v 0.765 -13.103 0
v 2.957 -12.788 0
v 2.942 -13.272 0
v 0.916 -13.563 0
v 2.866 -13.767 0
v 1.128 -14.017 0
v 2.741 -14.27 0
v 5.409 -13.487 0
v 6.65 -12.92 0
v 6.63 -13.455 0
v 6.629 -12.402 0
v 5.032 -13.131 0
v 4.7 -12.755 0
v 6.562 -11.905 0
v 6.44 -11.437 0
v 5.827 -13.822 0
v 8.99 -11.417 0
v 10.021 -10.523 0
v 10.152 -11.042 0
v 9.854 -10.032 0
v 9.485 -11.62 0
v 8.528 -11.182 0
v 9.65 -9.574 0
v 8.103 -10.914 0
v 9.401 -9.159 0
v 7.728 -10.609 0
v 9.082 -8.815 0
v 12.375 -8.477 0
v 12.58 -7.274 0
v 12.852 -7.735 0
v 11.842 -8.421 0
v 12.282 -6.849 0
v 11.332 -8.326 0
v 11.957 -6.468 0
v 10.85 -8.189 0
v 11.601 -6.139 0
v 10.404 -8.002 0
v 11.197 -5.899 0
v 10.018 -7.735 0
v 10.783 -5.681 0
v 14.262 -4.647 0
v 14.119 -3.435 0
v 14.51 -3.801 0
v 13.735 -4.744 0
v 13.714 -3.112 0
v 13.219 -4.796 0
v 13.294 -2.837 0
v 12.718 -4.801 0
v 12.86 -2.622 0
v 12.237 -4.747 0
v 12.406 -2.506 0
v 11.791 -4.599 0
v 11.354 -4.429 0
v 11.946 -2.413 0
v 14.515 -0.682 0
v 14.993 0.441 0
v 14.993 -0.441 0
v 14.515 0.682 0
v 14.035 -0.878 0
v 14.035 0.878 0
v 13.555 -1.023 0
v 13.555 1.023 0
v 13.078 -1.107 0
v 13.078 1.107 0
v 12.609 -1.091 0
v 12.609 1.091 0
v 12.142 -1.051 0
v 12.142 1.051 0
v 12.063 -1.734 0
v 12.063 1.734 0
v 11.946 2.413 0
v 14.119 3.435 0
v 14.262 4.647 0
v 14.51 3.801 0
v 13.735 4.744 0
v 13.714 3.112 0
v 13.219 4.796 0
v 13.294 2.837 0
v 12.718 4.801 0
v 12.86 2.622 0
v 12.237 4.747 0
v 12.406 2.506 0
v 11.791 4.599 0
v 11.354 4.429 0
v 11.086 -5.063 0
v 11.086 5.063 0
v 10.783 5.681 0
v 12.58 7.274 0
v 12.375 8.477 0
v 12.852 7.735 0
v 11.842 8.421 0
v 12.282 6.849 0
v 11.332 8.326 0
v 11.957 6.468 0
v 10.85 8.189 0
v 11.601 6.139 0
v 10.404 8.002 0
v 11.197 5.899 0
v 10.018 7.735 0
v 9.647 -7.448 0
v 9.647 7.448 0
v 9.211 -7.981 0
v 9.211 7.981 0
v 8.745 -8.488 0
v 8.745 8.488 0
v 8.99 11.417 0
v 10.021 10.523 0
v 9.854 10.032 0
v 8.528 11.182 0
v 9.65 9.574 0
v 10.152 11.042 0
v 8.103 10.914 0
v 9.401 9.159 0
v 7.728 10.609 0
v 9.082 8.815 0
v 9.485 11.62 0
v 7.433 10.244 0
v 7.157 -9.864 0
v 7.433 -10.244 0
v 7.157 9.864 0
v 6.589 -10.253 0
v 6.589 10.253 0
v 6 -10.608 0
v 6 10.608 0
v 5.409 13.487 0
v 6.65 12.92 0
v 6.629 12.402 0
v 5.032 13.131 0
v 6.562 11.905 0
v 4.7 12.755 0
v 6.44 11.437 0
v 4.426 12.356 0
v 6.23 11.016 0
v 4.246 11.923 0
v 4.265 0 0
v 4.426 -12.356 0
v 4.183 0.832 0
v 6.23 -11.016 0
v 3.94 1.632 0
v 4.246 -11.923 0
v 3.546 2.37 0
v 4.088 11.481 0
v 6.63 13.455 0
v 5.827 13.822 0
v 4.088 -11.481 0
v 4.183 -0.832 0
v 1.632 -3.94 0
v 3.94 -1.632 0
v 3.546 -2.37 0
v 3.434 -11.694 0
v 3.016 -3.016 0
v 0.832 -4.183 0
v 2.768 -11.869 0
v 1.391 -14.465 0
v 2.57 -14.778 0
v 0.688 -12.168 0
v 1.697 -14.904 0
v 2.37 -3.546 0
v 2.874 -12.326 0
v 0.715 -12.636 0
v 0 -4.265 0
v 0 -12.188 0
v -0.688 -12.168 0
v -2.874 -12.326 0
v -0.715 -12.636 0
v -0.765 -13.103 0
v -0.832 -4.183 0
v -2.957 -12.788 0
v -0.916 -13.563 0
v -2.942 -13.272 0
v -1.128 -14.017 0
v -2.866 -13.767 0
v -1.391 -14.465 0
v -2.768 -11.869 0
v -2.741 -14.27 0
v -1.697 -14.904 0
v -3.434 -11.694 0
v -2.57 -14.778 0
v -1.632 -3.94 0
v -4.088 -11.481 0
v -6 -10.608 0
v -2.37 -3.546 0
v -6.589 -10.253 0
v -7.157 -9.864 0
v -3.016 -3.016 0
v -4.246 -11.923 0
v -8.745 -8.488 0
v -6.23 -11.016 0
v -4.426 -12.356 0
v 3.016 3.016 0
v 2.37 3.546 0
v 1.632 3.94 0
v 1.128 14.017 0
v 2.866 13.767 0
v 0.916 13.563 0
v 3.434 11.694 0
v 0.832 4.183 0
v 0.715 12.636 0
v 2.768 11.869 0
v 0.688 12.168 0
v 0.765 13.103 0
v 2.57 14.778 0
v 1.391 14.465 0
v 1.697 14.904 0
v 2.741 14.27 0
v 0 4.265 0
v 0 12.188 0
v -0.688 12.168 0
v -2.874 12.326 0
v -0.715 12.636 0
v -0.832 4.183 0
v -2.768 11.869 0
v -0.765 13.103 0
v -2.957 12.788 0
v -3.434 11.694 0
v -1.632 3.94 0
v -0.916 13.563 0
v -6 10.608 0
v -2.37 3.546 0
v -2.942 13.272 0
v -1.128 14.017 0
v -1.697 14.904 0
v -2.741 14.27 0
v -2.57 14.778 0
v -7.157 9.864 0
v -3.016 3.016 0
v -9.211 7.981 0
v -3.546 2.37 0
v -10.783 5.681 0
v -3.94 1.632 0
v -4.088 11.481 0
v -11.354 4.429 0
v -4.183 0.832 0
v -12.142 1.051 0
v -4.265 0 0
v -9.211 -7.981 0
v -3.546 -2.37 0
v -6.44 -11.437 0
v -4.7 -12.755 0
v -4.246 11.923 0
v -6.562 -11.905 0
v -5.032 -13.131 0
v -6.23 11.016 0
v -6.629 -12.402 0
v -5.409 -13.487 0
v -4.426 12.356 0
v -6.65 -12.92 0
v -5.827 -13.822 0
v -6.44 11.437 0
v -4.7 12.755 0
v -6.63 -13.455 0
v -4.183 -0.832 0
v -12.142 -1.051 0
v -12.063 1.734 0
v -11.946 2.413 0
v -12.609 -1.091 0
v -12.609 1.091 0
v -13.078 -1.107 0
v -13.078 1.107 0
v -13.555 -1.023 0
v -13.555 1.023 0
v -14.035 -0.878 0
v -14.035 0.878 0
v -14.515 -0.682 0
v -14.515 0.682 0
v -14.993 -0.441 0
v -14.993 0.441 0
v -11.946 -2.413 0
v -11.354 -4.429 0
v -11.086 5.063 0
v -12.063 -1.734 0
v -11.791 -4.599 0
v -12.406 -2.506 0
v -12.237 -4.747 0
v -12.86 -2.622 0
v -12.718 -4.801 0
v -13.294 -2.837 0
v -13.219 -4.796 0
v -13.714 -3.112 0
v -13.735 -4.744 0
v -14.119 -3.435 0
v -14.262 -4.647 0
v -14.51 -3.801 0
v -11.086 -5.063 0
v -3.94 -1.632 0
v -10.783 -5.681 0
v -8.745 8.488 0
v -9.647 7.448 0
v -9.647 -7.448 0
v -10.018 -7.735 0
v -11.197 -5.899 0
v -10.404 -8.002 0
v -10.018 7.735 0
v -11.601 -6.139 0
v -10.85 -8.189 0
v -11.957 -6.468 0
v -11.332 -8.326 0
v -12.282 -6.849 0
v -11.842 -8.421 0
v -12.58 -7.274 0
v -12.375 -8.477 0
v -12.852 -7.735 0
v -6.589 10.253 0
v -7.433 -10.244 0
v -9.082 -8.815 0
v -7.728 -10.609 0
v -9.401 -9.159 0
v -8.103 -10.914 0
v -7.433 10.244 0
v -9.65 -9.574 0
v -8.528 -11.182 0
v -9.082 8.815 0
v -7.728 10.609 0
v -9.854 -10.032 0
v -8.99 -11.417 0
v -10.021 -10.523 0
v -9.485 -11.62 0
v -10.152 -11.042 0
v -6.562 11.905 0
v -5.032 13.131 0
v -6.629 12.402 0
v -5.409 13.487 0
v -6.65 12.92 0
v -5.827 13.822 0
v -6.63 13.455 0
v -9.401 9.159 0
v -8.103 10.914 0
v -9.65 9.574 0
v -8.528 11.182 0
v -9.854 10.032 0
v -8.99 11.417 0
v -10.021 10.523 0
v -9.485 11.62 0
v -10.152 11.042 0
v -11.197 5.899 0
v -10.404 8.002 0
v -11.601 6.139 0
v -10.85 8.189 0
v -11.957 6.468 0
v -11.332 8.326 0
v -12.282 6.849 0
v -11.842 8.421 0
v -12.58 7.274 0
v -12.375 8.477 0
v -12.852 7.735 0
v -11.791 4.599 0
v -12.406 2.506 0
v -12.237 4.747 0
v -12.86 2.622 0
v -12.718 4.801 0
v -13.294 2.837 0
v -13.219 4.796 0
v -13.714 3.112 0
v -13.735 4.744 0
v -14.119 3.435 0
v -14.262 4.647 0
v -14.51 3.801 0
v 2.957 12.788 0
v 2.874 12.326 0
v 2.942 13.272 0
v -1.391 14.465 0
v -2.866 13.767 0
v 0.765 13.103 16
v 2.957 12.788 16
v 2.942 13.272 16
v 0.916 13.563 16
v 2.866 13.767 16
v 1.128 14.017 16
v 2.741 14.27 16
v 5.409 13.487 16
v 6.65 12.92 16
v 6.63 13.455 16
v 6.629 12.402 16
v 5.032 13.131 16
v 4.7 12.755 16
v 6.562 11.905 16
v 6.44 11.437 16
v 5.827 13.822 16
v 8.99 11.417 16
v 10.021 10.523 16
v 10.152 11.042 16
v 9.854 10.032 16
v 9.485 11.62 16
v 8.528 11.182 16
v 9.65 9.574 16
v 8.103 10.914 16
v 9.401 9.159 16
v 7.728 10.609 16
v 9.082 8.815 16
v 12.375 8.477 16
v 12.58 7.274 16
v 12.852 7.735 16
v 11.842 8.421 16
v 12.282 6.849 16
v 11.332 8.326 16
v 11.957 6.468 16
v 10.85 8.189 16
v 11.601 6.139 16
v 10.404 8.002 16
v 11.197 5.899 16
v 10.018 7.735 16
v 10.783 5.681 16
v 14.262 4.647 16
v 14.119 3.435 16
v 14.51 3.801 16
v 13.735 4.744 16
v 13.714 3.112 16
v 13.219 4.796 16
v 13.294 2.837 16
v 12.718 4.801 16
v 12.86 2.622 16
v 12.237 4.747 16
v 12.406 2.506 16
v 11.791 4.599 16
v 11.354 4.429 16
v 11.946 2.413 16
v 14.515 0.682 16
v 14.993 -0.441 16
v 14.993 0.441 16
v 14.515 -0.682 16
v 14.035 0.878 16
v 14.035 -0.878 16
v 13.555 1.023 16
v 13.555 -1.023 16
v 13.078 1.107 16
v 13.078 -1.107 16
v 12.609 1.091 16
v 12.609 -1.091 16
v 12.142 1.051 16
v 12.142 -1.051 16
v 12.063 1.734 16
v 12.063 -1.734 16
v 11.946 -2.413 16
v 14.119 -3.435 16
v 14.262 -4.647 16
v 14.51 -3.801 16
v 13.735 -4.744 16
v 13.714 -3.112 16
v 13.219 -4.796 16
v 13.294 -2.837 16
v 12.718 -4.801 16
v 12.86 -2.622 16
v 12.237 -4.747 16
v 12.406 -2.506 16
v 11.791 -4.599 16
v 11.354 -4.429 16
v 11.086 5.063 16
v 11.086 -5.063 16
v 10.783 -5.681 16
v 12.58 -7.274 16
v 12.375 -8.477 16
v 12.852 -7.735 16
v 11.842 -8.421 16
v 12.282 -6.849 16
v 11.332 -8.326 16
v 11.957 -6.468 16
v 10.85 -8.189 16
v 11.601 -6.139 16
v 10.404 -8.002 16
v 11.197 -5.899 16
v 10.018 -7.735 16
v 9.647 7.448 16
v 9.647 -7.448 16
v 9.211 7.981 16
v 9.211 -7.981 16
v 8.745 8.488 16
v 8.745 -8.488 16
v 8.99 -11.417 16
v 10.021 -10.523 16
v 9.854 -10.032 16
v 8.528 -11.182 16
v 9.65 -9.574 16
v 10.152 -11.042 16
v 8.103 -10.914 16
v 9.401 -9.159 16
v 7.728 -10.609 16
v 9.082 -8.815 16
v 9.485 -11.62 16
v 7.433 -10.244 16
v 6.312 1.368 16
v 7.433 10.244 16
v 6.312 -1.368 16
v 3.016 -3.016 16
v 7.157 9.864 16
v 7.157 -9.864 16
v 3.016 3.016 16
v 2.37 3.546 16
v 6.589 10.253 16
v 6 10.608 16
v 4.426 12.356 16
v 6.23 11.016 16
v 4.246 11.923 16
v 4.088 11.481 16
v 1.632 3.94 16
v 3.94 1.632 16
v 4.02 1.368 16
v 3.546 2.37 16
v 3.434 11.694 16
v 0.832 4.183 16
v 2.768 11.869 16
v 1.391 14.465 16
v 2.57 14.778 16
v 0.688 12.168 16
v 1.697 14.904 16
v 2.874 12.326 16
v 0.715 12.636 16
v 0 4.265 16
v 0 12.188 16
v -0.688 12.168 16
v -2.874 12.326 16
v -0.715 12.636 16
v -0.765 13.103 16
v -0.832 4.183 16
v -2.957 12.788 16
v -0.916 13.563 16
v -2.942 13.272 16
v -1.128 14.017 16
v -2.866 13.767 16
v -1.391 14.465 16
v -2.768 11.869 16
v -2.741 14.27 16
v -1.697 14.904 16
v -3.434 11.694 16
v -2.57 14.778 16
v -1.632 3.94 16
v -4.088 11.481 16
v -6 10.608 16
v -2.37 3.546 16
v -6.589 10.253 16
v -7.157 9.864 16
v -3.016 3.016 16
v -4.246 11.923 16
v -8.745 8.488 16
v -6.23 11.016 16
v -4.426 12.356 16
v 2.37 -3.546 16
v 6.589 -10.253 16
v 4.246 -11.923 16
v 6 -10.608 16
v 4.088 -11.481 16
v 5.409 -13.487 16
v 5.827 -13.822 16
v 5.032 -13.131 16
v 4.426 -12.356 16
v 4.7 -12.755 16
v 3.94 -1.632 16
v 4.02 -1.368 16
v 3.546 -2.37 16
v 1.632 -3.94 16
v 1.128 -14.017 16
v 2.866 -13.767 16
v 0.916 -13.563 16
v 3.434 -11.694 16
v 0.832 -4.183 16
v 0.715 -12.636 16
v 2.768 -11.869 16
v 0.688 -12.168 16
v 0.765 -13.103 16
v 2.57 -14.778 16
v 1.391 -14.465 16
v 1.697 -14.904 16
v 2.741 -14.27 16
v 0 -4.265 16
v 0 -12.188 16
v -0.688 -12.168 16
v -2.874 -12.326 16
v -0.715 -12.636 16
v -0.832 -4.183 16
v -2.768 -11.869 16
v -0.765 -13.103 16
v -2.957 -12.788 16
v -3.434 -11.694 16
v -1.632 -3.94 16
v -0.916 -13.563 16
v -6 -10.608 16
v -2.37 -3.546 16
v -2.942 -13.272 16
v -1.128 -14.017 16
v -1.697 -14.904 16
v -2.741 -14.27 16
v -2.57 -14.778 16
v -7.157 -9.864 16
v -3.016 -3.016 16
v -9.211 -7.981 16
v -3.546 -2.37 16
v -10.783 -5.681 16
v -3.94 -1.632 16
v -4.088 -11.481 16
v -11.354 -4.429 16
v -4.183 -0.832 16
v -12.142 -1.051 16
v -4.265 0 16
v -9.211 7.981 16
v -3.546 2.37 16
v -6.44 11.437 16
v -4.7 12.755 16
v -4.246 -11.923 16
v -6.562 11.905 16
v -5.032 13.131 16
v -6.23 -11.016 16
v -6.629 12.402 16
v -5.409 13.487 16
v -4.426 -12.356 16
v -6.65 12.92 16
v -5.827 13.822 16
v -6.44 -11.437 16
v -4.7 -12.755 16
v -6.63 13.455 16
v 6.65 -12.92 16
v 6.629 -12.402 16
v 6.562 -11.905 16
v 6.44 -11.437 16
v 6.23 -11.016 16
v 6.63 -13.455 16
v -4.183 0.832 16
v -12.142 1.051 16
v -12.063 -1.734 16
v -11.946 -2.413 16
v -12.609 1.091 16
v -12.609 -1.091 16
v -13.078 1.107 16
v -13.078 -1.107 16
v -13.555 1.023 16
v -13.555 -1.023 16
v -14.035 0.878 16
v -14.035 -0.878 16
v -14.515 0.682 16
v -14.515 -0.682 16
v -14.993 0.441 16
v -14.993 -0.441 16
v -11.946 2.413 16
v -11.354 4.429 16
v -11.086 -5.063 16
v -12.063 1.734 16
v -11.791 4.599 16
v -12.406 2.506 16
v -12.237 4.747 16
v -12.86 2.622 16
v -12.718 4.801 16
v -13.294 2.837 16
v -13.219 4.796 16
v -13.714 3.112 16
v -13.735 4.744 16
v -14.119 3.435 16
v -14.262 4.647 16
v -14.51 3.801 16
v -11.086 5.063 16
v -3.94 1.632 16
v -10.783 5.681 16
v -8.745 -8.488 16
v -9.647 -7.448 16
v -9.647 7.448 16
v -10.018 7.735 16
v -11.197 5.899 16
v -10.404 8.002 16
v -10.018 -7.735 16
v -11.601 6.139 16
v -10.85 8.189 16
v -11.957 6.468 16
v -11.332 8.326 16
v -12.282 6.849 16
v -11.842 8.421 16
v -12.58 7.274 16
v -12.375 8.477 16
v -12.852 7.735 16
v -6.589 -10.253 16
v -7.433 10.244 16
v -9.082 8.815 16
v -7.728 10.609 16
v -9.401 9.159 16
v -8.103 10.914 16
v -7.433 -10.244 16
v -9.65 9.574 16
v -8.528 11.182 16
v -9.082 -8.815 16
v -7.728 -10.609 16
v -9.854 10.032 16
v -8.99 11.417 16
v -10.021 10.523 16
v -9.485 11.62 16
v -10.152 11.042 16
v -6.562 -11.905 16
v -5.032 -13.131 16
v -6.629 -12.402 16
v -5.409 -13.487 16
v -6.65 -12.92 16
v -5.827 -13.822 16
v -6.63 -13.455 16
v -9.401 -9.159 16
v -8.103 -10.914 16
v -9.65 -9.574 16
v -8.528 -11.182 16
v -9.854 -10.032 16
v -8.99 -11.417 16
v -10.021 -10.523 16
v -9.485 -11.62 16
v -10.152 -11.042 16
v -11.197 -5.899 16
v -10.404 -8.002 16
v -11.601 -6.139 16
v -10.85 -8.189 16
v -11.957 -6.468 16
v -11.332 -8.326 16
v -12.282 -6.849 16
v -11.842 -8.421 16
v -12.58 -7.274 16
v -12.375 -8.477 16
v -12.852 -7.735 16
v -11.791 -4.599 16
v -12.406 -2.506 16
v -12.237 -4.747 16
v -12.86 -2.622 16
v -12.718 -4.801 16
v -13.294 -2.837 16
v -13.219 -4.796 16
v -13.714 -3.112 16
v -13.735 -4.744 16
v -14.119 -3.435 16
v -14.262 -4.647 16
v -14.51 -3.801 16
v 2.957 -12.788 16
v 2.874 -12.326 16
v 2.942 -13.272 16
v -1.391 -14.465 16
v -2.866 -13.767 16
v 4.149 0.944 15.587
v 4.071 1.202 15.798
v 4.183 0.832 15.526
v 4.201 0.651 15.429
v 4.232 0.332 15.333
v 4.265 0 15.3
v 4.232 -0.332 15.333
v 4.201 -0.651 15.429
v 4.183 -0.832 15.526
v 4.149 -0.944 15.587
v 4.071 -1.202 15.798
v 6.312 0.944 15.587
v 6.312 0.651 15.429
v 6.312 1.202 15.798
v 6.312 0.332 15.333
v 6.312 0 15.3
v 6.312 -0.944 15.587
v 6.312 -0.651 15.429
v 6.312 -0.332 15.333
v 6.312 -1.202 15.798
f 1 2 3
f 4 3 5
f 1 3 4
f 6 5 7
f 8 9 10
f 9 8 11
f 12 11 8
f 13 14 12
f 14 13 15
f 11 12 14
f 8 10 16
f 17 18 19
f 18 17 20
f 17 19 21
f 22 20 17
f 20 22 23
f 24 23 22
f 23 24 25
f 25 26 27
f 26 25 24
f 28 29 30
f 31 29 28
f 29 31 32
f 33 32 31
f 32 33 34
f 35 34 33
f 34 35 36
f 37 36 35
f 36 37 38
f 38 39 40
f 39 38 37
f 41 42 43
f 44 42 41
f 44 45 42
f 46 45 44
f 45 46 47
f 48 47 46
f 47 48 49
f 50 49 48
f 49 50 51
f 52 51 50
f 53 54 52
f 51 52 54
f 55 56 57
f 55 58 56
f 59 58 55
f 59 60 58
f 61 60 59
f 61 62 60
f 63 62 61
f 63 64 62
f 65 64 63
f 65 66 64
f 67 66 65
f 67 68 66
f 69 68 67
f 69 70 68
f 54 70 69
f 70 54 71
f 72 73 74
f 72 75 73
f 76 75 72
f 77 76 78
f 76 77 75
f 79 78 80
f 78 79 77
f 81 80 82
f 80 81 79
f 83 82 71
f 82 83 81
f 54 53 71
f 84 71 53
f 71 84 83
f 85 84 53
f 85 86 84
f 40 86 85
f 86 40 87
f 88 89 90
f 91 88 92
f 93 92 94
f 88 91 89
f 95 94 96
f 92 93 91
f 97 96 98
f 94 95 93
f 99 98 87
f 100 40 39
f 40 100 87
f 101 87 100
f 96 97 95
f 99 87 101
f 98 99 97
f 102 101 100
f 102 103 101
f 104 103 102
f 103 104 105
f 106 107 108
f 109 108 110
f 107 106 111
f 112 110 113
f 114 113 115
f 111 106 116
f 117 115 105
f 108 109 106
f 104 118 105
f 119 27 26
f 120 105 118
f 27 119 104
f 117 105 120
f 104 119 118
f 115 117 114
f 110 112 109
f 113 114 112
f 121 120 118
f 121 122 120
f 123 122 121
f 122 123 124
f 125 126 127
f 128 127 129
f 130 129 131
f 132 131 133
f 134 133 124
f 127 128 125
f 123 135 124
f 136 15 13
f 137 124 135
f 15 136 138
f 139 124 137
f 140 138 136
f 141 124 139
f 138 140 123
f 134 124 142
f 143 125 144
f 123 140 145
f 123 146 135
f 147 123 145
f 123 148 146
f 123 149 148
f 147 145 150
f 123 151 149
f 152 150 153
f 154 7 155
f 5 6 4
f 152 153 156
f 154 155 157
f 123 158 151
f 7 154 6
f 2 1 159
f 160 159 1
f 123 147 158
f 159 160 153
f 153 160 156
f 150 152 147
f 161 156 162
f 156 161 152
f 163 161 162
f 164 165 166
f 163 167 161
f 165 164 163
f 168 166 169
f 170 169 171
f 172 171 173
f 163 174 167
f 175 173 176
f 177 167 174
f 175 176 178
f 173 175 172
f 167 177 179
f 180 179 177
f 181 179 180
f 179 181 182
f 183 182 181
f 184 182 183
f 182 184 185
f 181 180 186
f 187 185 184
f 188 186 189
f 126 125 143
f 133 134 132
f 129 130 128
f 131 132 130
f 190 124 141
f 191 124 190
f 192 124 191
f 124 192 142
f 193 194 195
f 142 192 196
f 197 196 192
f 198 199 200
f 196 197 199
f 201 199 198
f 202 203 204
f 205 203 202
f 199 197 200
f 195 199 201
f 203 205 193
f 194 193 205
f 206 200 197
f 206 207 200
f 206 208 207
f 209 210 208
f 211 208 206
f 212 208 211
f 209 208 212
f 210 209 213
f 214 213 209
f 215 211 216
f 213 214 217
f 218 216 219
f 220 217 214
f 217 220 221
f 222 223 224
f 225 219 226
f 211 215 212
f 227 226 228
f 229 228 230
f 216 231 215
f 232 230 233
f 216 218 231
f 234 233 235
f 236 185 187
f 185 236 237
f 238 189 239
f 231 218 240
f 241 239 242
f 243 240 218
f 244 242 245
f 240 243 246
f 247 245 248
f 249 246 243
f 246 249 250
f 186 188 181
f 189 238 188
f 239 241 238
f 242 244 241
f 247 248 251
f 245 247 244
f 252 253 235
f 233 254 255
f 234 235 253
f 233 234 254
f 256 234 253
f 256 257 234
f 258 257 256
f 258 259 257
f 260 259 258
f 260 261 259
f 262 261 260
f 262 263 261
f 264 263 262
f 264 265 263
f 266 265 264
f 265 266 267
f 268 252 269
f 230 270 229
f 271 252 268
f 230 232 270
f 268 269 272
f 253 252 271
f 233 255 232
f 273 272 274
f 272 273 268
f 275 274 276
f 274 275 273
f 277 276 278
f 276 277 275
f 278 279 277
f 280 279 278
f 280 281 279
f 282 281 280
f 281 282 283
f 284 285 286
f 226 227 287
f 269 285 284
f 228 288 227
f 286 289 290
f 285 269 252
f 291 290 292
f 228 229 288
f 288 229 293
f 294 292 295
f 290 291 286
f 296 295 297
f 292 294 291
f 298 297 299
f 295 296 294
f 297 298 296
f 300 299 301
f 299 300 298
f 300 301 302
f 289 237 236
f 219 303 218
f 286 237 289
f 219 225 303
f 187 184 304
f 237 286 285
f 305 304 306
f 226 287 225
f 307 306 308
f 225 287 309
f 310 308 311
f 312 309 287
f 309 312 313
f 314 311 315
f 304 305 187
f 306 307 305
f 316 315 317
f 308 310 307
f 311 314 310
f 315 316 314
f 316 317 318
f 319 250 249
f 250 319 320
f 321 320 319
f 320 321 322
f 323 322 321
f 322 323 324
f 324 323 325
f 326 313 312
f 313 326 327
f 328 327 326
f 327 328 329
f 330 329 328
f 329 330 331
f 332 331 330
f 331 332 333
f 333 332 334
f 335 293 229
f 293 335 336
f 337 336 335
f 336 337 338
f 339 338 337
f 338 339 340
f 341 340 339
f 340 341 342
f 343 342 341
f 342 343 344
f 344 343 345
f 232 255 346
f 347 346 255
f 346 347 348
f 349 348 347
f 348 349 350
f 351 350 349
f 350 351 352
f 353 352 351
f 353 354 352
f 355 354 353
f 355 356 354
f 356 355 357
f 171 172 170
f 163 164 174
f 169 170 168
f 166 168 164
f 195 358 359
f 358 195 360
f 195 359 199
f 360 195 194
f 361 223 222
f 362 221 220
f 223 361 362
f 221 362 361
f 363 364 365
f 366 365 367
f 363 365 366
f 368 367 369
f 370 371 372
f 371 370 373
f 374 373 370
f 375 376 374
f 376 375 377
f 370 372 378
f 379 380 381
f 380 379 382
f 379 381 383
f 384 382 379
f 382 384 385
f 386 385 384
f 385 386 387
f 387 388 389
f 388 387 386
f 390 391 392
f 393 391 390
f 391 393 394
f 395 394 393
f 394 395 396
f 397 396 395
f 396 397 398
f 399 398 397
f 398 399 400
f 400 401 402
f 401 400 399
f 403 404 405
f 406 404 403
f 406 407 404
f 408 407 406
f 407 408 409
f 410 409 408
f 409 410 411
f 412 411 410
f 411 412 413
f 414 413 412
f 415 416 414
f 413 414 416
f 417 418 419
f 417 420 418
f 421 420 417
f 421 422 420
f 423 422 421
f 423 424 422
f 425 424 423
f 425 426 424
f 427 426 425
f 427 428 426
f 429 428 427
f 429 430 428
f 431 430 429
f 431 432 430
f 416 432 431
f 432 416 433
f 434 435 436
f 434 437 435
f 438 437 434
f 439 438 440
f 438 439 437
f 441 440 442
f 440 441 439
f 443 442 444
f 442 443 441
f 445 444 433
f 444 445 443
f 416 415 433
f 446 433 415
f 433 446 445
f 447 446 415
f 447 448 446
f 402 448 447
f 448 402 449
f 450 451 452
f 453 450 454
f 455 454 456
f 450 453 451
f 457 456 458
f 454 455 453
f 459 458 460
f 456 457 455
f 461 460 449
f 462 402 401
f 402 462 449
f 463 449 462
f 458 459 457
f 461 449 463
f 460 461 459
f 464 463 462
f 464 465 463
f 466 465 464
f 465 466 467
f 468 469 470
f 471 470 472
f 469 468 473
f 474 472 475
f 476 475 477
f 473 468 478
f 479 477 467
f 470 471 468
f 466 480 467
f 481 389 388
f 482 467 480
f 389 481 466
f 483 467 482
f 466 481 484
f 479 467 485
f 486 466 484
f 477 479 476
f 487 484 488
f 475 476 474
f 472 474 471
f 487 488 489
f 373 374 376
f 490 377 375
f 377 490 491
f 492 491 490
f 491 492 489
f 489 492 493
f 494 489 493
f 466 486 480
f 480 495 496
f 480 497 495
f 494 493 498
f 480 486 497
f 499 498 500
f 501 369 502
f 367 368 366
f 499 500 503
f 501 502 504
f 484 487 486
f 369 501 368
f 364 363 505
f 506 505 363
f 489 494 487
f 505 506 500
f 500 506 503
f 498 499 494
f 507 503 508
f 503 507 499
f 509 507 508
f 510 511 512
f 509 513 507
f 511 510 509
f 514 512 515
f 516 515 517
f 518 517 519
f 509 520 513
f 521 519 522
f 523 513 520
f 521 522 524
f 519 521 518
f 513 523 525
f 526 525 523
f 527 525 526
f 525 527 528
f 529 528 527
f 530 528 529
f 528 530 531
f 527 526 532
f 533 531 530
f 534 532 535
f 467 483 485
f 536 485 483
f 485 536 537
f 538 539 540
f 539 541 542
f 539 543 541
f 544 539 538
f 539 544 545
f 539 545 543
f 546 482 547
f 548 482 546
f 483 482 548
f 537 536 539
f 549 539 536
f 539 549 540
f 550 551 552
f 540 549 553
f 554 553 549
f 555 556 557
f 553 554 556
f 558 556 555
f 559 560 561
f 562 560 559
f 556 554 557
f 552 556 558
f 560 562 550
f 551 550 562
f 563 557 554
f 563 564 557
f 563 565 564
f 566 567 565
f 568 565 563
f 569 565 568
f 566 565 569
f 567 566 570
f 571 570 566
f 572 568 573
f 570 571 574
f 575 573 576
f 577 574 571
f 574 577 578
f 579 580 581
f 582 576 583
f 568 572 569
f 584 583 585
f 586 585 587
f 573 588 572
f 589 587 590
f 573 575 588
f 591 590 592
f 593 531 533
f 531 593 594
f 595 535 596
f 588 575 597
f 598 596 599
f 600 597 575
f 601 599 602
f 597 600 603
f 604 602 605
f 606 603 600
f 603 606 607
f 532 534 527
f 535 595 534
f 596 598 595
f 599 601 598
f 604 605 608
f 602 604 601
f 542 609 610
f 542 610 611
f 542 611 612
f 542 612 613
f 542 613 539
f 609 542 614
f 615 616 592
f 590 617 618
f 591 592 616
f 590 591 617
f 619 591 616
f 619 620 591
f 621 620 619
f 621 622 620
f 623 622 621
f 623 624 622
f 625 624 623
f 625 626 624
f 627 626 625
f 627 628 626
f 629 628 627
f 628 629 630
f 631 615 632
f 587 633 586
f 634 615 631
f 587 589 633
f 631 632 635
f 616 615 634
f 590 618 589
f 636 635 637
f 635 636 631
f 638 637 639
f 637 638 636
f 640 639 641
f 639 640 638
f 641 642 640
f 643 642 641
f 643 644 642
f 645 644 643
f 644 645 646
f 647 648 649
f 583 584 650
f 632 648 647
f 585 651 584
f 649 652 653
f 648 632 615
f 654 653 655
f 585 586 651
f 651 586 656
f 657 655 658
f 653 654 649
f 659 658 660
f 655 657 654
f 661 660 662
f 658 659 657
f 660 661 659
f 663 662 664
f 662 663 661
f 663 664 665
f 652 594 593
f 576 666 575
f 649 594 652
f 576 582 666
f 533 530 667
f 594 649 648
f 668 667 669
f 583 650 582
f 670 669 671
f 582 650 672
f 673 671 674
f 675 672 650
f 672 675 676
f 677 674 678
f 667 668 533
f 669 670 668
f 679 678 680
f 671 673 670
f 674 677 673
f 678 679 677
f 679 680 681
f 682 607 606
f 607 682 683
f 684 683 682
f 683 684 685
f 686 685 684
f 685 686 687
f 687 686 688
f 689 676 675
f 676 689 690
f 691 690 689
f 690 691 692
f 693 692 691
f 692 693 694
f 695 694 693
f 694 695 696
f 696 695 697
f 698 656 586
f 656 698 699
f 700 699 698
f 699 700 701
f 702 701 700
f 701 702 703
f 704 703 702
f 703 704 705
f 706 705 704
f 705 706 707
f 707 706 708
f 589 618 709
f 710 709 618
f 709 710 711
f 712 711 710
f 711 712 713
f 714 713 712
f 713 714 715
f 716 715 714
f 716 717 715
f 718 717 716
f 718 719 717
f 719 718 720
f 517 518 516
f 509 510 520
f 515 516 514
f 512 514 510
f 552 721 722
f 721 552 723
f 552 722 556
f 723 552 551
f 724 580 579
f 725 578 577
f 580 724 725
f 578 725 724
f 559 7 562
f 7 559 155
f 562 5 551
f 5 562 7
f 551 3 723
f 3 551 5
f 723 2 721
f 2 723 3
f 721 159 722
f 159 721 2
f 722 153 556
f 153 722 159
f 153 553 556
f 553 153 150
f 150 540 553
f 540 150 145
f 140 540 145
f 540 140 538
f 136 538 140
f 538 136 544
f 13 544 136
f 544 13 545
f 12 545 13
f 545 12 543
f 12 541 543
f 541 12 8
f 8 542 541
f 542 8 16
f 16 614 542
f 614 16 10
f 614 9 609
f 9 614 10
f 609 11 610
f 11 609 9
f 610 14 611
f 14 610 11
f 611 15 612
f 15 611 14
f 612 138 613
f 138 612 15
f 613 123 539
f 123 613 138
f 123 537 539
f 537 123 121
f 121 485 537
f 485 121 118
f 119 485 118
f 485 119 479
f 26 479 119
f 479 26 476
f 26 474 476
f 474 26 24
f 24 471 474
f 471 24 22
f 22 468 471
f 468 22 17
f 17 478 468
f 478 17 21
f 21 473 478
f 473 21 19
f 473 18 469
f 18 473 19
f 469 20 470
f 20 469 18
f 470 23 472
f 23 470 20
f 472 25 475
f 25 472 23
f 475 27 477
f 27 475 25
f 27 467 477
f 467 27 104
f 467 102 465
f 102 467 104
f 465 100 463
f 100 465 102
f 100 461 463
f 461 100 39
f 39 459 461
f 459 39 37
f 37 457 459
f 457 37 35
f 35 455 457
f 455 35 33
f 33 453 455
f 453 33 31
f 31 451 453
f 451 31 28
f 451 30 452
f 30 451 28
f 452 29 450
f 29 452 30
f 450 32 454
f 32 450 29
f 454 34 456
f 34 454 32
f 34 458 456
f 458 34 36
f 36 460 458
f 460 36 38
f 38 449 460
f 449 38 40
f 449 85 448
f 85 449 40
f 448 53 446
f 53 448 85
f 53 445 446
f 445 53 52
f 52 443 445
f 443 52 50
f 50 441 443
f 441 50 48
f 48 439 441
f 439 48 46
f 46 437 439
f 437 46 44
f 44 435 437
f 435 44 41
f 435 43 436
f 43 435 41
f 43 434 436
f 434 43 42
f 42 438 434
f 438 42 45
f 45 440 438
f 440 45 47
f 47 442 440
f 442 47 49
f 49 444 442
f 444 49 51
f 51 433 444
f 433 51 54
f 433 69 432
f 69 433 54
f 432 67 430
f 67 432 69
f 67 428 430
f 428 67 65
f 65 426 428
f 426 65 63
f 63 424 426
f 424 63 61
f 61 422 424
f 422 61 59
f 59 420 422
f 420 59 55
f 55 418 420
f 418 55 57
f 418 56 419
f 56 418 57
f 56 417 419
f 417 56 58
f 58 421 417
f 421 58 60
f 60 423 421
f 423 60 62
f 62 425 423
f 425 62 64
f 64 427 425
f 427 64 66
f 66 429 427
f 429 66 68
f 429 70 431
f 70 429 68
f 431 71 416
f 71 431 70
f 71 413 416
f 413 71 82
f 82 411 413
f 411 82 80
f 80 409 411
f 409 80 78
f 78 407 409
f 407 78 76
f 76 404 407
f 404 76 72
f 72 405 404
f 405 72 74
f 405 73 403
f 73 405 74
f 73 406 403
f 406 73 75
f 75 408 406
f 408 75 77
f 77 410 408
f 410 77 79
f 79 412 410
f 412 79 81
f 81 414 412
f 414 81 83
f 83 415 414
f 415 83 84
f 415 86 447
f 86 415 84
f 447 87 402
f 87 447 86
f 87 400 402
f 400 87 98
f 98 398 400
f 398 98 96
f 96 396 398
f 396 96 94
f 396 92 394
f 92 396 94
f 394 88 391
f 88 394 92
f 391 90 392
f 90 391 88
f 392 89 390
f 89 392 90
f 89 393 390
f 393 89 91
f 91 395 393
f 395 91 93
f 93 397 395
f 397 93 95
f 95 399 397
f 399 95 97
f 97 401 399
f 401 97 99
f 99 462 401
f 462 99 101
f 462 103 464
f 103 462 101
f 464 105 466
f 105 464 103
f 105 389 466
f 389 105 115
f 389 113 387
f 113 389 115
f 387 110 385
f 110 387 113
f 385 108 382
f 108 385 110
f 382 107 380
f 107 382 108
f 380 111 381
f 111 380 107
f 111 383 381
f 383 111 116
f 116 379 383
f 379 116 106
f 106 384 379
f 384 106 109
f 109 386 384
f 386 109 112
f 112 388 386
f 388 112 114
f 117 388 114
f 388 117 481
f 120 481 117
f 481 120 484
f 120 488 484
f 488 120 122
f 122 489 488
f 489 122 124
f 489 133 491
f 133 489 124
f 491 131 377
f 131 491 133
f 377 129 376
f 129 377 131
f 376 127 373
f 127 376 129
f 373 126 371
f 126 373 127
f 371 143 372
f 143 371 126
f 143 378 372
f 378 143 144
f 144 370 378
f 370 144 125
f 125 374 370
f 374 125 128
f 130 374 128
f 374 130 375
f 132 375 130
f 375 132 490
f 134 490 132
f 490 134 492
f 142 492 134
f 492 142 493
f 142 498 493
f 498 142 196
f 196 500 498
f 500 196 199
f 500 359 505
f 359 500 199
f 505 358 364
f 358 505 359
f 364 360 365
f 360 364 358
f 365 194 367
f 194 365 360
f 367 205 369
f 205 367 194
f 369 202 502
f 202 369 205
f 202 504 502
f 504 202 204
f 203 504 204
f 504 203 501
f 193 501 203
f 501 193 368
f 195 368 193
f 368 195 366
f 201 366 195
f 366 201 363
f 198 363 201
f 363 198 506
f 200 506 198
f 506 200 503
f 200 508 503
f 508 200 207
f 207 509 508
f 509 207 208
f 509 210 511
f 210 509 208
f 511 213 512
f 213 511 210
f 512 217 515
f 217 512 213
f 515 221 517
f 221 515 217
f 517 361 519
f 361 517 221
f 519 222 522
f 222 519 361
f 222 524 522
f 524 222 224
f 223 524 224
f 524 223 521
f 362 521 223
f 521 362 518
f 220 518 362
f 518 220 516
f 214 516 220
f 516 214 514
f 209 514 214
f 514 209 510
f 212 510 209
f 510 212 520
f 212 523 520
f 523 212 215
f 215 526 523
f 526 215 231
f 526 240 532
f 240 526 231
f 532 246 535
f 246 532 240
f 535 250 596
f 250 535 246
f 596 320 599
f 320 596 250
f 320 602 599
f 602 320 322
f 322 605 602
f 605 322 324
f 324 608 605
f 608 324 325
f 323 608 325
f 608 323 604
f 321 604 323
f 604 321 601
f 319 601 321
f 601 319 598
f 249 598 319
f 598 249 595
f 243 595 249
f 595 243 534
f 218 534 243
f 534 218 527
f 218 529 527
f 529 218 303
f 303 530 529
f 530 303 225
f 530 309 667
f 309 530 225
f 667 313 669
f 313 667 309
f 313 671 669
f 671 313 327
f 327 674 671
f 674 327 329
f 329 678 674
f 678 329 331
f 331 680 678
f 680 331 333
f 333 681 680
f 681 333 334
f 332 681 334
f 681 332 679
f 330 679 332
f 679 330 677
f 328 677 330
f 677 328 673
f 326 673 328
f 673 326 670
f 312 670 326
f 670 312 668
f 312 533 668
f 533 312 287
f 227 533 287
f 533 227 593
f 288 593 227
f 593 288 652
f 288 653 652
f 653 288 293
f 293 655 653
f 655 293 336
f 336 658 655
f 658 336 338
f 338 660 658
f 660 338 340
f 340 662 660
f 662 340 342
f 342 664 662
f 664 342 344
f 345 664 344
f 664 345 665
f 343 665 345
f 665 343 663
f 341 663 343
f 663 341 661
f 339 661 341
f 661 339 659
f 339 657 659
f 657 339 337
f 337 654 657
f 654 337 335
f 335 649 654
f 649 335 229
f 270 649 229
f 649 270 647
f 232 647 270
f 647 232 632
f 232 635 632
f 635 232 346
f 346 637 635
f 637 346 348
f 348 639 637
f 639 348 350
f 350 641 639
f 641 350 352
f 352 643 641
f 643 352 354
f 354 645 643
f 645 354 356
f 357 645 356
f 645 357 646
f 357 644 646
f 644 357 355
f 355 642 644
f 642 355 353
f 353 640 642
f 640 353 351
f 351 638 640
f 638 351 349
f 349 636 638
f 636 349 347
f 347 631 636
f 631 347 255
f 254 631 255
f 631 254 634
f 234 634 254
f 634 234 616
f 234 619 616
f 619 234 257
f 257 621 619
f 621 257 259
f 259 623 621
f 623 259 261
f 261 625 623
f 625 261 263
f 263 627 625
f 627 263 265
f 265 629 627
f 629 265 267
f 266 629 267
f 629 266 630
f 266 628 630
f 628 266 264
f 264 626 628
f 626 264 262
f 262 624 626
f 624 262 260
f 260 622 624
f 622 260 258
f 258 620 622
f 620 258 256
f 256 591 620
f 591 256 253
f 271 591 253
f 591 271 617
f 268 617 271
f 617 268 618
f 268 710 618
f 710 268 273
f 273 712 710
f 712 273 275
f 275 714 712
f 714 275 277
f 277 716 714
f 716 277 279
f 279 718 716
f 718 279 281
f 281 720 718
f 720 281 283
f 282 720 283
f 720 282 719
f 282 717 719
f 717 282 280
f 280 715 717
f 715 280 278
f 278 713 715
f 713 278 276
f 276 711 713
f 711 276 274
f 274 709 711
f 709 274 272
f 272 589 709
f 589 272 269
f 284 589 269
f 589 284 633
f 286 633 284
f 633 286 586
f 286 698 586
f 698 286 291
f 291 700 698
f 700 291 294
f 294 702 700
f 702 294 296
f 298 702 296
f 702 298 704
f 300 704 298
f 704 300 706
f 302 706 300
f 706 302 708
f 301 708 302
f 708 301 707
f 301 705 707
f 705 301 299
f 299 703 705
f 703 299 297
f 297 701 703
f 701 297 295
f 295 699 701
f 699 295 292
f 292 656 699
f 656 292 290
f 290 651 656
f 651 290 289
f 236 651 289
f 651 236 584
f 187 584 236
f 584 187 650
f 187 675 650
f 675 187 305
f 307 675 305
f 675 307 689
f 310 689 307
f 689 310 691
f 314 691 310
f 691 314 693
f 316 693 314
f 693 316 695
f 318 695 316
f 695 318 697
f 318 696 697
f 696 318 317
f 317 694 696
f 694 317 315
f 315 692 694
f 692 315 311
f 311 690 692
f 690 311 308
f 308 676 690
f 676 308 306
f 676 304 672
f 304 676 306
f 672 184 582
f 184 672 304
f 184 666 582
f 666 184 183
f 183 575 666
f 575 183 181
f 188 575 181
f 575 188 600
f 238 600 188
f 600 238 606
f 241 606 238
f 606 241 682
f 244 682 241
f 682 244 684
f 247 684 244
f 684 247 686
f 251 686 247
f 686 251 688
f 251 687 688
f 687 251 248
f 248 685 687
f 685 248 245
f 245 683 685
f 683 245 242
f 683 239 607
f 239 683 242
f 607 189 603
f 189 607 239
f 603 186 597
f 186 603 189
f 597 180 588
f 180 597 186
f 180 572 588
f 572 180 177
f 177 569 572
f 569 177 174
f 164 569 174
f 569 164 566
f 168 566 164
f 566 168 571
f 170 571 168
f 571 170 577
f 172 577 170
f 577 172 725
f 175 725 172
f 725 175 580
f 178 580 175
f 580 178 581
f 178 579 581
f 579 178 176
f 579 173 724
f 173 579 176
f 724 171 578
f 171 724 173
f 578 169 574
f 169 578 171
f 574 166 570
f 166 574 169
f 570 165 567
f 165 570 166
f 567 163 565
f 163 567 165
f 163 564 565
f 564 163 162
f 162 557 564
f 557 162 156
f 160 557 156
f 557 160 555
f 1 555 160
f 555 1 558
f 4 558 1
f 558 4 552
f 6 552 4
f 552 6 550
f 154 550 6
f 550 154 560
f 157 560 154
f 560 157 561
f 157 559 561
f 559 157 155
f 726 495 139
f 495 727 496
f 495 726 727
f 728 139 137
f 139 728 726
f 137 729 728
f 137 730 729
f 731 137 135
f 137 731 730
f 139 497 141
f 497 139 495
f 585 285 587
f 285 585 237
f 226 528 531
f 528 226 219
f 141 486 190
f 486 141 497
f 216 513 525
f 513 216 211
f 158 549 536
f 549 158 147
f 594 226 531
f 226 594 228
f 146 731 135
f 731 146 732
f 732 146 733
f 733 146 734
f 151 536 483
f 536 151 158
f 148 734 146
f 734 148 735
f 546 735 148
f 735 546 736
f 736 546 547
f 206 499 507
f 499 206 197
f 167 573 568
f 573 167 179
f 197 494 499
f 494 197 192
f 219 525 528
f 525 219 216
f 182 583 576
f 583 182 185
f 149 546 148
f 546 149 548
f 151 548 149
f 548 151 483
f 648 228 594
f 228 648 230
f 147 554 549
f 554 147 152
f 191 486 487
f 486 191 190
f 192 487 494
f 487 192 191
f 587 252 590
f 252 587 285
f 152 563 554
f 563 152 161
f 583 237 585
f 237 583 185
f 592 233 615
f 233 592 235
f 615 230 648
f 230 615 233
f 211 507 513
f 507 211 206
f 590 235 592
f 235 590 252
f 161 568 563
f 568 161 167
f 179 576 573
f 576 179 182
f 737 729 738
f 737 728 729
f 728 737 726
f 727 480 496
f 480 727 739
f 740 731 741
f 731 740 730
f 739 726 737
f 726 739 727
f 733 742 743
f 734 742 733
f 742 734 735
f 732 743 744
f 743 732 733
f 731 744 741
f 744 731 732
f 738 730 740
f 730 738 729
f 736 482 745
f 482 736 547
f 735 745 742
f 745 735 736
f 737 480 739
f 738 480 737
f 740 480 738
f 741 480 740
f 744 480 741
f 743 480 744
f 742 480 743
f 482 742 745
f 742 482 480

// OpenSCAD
$fn = 32;

// ----------------------------------------------------------------------
// Spur gear: m=1.25 z=22, 30 mm tip diameter x 16 mm
// ----------------------------------------------------------------------

// --- parameters (mm) ---
modul = 1.25;             // module
n_teeth = 22;             // number of teeth
width = 16;               // face width
pa = 20;                  // pressure angle, deg
shaft_d = 8.53;           // shaft bore
set_d = 3.4;              // set screw tap hole
set_z = 17;               // set screw height

/* --- involute profile --- */
pitch_r = modul * n_teeth / 2;
base_r = pitch_r * cos(pa);
tip_r = pitch_r + modul;
root_r = pitch_r - 1.25 * modul;
flank_steps = 6;

function inv_deg(a) = (tan(a) - a * PI / 180) * 180 / PI;
function flank_r(i) = root_r + (tip_r - root_r) * i / flank_steps;
function half_angle(r) = 90 / n_teeth + inv_deg(pa) - inv_deg(acos(min(1, base_r / r)));
function tooth_pt(k, i, side) =
    let (r = flank_r(i), a = k * 360 / n_teeth + side * half_angle(r))
    [r * cos(a), r * sin(a)];

module tooth_profile() {
  polygon(points = [
    for (k = [0 : n_teeth - 1])
      each [
        for (i = [0 : flank_steps]) tooth_pt(k, i, -1),
        for (i = [flank_steps : -1 : 0]) tooth_pt(k, i, 1),
        let (ta = (k + 0.5) * 360 / n_teeth)
          [root_r * cos(ta), root_r * sin(ta)]
      ]
  ]);
}

module gear_disc() {
  linear_extrude(height = width) tooth_profile();
}

difference() {
  gear_disc();
  translate([0, 0, -1]) cylinder(h = width + 3, d = shaft_d);
  /* set screw, drilled radially */
  translate([-1, 0, set_z]) rotate([0, 90, 0]) cylinder(h = (root_r * 0.6), d = set_d);
}
